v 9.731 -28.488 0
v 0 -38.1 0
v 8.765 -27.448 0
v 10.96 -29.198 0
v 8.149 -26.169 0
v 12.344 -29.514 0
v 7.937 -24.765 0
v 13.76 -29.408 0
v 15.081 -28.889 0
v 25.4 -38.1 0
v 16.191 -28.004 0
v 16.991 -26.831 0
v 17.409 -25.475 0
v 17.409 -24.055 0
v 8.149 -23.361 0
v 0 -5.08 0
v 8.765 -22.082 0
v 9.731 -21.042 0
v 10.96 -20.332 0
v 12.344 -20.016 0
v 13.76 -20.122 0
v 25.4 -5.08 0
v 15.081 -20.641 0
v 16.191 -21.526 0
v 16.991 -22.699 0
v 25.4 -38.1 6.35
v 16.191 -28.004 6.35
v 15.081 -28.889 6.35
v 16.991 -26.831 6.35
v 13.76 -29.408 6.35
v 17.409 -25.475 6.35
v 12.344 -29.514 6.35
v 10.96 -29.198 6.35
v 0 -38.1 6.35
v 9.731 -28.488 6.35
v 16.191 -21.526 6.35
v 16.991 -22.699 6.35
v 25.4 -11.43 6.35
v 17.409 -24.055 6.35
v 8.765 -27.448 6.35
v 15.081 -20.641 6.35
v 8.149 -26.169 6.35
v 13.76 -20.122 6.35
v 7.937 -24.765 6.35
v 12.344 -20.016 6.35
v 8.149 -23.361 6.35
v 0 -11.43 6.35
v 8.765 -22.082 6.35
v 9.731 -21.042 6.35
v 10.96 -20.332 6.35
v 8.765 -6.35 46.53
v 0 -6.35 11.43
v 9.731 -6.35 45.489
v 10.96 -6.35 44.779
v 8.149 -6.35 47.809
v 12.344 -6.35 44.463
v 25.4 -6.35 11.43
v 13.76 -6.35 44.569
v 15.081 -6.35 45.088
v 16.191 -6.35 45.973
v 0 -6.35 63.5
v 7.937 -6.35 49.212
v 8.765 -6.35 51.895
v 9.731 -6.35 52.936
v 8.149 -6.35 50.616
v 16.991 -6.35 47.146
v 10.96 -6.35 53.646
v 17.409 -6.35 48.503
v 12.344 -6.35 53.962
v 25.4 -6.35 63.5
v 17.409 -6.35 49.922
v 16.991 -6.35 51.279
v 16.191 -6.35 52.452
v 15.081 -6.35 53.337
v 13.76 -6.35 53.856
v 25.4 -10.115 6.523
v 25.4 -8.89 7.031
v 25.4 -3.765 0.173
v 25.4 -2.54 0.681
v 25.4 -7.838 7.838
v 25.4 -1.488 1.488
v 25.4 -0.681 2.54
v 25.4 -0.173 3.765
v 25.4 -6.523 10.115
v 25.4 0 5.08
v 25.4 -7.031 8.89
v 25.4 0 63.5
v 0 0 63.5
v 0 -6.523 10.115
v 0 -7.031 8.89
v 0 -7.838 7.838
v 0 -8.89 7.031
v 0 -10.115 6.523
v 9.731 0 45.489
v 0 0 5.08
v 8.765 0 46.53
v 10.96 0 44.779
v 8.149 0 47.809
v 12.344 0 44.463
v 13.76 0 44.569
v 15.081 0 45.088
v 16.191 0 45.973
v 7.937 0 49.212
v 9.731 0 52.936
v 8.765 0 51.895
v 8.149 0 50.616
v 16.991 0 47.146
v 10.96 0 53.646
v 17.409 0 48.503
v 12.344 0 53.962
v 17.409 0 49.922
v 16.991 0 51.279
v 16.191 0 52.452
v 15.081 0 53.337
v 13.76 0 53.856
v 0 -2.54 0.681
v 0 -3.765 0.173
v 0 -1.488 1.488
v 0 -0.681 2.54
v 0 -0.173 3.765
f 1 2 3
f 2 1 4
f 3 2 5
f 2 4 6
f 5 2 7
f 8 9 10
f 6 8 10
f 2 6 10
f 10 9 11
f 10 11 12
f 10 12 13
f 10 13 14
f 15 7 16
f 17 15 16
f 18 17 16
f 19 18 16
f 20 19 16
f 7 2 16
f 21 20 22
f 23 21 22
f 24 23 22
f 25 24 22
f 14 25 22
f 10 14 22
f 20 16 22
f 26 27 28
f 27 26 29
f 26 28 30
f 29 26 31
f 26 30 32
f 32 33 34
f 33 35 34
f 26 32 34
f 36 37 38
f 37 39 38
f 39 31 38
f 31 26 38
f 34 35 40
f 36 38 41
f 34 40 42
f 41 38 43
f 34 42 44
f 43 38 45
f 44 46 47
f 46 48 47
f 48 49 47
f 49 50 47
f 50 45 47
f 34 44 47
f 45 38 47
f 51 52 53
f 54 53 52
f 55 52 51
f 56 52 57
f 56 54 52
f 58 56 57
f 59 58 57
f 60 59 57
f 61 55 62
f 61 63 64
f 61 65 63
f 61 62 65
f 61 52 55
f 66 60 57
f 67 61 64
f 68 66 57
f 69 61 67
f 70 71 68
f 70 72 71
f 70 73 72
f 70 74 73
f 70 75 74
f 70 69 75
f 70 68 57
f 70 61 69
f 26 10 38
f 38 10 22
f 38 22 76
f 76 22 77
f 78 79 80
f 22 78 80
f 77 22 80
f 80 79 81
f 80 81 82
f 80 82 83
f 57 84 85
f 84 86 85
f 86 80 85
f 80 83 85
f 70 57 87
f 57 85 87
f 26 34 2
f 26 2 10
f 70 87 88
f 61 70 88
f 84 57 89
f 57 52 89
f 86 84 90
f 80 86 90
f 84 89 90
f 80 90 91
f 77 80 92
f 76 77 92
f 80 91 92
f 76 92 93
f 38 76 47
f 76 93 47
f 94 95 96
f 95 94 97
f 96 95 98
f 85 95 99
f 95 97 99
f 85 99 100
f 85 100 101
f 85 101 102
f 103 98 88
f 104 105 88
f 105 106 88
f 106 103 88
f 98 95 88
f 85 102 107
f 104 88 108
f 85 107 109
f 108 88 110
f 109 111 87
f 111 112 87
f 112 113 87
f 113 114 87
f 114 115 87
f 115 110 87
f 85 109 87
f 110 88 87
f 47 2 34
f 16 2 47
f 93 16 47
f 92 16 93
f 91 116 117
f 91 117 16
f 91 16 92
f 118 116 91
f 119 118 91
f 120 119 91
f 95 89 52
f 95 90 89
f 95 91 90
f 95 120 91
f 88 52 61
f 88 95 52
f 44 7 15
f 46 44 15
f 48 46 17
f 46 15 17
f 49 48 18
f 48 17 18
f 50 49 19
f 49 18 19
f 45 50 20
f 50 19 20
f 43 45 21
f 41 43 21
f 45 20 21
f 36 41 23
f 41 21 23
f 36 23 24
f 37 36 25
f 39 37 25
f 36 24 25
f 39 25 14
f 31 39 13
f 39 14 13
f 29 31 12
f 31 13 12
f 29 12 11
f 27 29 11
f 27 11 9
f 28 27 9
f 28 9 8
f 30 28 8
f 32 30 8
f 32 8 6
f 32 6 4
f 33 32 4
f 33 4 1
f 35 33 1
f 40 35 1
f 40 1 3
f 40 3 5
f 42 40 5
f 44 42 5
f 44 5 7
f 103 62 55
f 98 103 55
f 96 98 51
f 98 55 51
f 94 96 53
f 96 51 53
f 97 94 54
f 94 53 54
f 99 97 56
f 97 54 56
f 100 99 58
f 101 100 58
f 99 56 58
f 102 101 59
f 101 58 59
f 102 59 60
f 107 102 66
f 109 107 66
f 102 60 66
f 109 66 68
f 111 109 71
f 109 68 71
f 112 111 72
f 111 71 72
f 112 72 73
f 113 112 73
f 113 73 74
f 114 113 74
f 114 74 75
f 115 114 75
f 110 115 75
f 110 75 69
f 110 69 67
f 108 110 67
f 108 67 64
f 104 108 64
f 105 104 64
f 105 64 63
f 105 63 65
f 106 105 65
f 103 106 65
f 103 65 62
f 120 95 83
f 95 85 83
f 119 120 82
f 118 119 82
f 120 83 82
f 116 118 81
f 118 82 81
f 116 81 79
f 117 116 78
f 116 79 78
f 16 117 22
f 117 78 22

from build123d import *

# Parameters (mm, degrees)
F0_W     = 12.7
F0_H     = 6.35
F1_DEPTH = 38.1
F0_H_2   = 57.15
F2_DEPTH = 6.35
F3_R     = 5.08
F5_D     = 9.525
F6_D     = 9.525


# Not quite as in the source:
# - a length typed as a fraction of an inch, garbled in the dataset ("3 / 203.2 mm" for 3/8 in), is restored


with BuildPart() as f1:
    # F0 (on Front) → F1 (new body)
    with BuildSketch(Plane.XZ):
        with Locations((6.35, 3.175)):
            Rectangle(F0_W, F0_H)
        with Locations((19.05, 3.175)):
            Rectangle(F0_W, F0_H)
    extrude(amount=F1_DEPTH)

    # F0 (on Front) → F2 (join)
    with BuildSketch(Plane.XZ):
        with Locations((6.35, 3.175)):
            Rectangle(F0_W, F0_H)
        with Locations((19.05, 3.175)):
            Rectangle(F0_W, F0_H)
        with Locations((6.35, 34.925)):
            Rectangle(F0_W, F0_H_2)
        with Locations((19.05, 34.925)):
            Rectangle(F0_W, F0_H_2)
    extrude(amount=F2_DEPTH)

    # F3
    f3_edges = [f1.edges().sort_by_distance(p)[0] for p in [
        (12.7, -6.35, 6.35),
        (12.7, 0, 0),
    ]]
    fillet(f3_edges, radius=F3_R)

    # F5 (through all)
    with Locations(Plane.XY.offset(6.35)):
        with Locations((12.7, -24.765)):
            Hole(F5_D / 2)

    # F6 (through all)
    with Locations(Plane(origin=(0, 0, 0), x_dir=(1, 0, 0), z_dir=(0, 1, 0))):
        with Locations((12.7, -49.2125)):
            Hole(F6_D / 2)


solid = f1.part
